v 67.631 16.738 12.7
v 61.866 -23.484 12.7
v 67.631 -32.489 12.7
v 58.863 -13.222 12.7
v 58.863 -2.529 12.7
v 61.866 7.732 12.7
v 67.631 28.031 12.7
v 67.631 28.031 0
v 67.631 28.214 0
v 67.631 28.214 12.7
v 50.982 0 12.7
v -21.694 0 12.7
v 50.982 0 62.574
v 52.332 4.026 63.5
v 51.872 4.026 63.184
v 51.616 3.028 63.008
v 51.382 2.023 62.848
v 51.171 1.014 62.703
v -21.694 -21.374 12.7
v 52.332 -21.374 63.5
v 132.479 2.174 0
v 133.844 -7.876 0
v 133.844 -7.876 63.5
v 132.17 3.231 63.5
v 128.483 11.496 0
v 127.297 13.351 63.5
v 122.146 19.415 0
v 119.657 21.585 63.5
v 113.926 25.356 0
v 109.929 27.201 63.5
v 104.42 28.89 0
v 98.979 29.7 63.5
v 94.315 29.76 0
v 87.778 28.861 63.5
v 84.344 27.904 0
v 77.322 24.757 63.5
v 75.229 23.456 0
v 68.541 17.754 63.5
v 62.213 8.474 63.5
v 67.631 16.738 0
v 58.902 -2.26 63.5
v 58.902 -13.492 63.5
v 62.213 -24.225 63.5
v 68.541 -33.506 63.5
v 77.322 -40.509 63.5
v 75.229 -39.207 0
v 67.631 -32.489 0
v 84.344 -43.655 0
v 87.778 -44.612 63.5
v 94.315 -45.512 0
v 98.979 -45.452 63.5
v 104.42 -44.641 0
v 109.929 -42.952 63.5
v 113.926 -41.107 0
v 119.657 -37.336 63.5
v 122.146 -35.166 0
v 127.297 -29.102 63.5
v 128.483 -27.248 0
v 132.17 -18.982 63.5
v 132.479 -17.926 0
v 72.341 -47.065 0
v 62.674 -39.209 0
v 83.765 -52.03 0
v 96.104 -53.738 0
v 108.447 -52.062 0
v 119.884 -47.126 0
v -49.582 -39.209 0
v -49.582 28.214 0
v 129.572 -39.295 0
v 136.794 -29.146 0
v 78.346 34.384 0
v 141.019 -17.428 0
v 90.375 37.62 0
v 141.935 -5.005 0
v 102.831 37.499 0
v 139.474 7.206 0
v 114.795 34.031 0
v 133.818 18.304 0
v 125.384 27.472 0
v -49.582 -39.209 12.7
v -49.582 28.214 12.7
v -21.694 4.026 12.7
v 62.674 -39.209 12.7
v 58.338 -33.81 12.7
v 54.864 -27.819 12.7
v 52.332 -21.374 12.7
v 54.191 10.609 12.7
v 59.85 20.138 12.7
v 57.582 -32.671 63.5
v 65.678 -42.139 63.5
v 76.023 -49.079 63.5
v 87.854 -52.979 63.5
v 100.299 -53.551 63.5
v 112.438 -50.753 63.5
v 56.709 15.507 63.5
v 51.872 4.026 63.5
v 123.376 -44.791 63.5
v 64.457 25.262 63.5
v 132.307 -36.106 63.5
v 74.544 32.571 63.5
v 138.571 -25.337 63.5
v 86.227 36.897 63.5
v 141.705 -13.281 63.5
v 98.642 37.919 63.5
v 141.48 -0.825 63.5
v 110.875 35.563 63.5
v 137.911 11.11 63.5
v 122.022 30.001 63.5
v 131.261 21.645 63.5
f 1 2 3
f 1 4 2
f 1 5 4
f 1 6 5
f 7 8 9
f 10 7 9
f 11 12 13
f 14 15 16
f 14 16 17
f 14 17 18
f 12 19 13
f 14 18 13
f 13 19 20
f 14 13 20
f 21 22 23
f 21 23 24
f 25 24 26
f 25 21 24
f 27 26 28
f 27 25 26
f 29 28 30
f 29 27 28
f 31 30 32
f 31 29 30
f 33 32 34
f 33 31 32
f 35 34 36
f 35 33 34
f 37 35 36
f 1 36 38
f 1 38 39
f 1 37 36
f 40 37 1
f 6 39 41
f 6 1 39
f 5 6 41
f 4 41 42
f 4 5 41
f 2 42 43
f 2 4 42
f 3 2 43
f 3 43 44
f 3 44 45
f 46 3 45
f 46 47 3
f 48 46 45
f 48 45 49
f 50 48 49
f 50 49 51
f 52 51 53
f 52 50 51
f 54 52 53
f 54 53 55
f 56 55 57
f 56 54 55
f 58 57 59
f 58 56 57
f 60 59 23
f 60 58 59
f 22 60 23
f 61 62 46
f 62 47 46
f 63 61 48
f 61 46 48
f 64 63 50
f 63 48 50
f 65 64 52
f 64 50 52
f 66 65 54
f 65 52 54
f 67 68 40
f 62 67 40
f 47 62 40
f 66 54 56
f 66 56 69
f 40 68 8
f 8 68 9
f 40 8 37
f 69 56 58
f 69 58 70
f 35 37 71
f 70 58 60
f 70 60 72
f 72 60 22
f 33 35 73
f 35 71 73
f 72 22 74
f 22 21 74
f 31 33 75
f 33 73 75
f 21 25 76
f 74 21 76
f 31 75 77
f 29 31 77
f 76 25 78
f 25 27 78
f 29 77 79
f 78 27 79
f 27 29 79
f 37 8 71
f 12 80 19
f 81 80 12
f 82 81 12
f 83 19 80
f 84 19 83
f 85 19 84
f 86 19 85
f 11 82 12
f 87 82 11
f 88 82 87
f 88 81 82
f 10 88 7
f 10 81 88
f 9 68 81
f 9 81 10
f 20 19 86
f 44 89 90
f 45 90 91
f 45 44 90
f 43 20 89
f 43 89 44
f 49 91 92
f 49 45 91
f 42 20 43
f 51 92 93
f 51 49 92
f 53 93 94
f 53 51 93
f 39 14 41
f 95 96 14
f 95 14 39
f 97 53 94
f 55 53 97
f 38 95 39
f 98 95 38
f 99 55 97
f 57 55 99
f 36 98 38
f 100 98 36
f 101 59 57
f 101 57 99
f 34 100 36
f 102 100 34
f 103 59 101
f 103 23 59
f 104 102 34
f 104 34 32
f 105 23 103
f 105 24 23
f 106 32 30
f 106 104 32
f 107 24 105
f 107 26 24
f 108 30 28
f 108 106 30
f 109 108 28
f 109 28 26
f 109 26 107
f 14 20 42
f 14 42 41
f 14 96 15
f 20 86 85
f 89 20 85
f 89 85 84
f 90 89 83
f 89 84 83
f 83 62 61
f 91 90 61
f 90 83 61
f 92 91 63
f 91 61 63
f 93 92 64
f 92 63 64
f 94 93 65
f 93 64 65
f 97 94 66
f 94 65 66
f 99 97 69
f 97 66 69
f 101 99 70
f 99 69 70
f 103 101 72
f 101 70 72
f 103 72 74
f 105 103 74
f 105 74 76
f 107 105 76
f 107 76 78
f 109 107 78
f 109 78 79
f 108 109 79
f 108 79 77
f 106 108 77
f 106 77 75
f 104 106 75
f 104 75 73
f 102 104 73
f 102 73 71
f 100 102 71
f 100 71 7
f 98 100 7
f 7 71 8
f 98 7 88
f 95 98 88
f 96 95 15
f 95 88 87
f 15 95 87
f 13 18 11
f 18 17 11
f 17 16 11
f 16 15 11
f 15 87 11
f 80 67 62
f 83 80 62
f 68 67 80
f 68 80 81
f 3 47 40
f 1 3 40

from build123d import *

# Parameters (mm, degrees)
F0_W      = 117.213294
F0_H      = 67.42356
F1_DEPTH  = 25.4
F1_FACE_W = 117.213294
F1_FACE_H = 67.42356
F2_DEPTH  = 12.7
F3_R      = 45.862113
F3_R_2    = 37.681332
F4_DEPTH  = 63.5
F5_W      = 74.026364
F5_H      = 21.373598
F6_DEPTH  = 50.8
F8_DEPTH  = 25.4


with BuildPart() as f1:
    # F0 (on Top) → F1 (new body)
    with BuildSketch(Plane.XY):
        with Locations((9.024359, -5.497601)):
            Rectangle(F0_W, F0_H)
    extrude(amount=F1_DEPTH)

    # F1_face (on face) → F2 (cut)
    with BuildSketch(Plane(origin=(9.024359, -5.497601, 25.4), x_dir=(1, 0, 0), z_dir=(0, 0, 1))):
        Rectangle(F1_FACE_W, F1_FACE_H)
    extrude(amount=-F2_DEPTH, mode=Mode.SUBTRACT)

    # F3 (on Top) → F4 (join)
    with BuildSketch(Plane.XY):
        with Locations((96.162871, -7.875698)):
            Circle(F3_R)
        with Locations((96.162871, -7.875698)):
            Circle(F3_R_2, mode=Mode.SUBTRACT)
    extrude(amount=F4_DEPTH)

    # F5 (on face) → F6 (join)
    with BuildSketch(Plane.XY.offset(12.7)):
        with Locations((15.318876, -10.686799)):
            Rectangle(F5_W, F5_H)
    extrude(amount=F6_DEPTH)

    # F7 (on face) → F8 (cut)
    with BuildSketch(Plane.XZ.offset(21.373598)):
        Polygon((-21.694306, 63.5), (-21.694306, 12.7), (52.332058, 63.5), align=None)
    extrude(amount=-F8_DEPTH, mode=Mode.SUBTRACT)


solid = f1.part
